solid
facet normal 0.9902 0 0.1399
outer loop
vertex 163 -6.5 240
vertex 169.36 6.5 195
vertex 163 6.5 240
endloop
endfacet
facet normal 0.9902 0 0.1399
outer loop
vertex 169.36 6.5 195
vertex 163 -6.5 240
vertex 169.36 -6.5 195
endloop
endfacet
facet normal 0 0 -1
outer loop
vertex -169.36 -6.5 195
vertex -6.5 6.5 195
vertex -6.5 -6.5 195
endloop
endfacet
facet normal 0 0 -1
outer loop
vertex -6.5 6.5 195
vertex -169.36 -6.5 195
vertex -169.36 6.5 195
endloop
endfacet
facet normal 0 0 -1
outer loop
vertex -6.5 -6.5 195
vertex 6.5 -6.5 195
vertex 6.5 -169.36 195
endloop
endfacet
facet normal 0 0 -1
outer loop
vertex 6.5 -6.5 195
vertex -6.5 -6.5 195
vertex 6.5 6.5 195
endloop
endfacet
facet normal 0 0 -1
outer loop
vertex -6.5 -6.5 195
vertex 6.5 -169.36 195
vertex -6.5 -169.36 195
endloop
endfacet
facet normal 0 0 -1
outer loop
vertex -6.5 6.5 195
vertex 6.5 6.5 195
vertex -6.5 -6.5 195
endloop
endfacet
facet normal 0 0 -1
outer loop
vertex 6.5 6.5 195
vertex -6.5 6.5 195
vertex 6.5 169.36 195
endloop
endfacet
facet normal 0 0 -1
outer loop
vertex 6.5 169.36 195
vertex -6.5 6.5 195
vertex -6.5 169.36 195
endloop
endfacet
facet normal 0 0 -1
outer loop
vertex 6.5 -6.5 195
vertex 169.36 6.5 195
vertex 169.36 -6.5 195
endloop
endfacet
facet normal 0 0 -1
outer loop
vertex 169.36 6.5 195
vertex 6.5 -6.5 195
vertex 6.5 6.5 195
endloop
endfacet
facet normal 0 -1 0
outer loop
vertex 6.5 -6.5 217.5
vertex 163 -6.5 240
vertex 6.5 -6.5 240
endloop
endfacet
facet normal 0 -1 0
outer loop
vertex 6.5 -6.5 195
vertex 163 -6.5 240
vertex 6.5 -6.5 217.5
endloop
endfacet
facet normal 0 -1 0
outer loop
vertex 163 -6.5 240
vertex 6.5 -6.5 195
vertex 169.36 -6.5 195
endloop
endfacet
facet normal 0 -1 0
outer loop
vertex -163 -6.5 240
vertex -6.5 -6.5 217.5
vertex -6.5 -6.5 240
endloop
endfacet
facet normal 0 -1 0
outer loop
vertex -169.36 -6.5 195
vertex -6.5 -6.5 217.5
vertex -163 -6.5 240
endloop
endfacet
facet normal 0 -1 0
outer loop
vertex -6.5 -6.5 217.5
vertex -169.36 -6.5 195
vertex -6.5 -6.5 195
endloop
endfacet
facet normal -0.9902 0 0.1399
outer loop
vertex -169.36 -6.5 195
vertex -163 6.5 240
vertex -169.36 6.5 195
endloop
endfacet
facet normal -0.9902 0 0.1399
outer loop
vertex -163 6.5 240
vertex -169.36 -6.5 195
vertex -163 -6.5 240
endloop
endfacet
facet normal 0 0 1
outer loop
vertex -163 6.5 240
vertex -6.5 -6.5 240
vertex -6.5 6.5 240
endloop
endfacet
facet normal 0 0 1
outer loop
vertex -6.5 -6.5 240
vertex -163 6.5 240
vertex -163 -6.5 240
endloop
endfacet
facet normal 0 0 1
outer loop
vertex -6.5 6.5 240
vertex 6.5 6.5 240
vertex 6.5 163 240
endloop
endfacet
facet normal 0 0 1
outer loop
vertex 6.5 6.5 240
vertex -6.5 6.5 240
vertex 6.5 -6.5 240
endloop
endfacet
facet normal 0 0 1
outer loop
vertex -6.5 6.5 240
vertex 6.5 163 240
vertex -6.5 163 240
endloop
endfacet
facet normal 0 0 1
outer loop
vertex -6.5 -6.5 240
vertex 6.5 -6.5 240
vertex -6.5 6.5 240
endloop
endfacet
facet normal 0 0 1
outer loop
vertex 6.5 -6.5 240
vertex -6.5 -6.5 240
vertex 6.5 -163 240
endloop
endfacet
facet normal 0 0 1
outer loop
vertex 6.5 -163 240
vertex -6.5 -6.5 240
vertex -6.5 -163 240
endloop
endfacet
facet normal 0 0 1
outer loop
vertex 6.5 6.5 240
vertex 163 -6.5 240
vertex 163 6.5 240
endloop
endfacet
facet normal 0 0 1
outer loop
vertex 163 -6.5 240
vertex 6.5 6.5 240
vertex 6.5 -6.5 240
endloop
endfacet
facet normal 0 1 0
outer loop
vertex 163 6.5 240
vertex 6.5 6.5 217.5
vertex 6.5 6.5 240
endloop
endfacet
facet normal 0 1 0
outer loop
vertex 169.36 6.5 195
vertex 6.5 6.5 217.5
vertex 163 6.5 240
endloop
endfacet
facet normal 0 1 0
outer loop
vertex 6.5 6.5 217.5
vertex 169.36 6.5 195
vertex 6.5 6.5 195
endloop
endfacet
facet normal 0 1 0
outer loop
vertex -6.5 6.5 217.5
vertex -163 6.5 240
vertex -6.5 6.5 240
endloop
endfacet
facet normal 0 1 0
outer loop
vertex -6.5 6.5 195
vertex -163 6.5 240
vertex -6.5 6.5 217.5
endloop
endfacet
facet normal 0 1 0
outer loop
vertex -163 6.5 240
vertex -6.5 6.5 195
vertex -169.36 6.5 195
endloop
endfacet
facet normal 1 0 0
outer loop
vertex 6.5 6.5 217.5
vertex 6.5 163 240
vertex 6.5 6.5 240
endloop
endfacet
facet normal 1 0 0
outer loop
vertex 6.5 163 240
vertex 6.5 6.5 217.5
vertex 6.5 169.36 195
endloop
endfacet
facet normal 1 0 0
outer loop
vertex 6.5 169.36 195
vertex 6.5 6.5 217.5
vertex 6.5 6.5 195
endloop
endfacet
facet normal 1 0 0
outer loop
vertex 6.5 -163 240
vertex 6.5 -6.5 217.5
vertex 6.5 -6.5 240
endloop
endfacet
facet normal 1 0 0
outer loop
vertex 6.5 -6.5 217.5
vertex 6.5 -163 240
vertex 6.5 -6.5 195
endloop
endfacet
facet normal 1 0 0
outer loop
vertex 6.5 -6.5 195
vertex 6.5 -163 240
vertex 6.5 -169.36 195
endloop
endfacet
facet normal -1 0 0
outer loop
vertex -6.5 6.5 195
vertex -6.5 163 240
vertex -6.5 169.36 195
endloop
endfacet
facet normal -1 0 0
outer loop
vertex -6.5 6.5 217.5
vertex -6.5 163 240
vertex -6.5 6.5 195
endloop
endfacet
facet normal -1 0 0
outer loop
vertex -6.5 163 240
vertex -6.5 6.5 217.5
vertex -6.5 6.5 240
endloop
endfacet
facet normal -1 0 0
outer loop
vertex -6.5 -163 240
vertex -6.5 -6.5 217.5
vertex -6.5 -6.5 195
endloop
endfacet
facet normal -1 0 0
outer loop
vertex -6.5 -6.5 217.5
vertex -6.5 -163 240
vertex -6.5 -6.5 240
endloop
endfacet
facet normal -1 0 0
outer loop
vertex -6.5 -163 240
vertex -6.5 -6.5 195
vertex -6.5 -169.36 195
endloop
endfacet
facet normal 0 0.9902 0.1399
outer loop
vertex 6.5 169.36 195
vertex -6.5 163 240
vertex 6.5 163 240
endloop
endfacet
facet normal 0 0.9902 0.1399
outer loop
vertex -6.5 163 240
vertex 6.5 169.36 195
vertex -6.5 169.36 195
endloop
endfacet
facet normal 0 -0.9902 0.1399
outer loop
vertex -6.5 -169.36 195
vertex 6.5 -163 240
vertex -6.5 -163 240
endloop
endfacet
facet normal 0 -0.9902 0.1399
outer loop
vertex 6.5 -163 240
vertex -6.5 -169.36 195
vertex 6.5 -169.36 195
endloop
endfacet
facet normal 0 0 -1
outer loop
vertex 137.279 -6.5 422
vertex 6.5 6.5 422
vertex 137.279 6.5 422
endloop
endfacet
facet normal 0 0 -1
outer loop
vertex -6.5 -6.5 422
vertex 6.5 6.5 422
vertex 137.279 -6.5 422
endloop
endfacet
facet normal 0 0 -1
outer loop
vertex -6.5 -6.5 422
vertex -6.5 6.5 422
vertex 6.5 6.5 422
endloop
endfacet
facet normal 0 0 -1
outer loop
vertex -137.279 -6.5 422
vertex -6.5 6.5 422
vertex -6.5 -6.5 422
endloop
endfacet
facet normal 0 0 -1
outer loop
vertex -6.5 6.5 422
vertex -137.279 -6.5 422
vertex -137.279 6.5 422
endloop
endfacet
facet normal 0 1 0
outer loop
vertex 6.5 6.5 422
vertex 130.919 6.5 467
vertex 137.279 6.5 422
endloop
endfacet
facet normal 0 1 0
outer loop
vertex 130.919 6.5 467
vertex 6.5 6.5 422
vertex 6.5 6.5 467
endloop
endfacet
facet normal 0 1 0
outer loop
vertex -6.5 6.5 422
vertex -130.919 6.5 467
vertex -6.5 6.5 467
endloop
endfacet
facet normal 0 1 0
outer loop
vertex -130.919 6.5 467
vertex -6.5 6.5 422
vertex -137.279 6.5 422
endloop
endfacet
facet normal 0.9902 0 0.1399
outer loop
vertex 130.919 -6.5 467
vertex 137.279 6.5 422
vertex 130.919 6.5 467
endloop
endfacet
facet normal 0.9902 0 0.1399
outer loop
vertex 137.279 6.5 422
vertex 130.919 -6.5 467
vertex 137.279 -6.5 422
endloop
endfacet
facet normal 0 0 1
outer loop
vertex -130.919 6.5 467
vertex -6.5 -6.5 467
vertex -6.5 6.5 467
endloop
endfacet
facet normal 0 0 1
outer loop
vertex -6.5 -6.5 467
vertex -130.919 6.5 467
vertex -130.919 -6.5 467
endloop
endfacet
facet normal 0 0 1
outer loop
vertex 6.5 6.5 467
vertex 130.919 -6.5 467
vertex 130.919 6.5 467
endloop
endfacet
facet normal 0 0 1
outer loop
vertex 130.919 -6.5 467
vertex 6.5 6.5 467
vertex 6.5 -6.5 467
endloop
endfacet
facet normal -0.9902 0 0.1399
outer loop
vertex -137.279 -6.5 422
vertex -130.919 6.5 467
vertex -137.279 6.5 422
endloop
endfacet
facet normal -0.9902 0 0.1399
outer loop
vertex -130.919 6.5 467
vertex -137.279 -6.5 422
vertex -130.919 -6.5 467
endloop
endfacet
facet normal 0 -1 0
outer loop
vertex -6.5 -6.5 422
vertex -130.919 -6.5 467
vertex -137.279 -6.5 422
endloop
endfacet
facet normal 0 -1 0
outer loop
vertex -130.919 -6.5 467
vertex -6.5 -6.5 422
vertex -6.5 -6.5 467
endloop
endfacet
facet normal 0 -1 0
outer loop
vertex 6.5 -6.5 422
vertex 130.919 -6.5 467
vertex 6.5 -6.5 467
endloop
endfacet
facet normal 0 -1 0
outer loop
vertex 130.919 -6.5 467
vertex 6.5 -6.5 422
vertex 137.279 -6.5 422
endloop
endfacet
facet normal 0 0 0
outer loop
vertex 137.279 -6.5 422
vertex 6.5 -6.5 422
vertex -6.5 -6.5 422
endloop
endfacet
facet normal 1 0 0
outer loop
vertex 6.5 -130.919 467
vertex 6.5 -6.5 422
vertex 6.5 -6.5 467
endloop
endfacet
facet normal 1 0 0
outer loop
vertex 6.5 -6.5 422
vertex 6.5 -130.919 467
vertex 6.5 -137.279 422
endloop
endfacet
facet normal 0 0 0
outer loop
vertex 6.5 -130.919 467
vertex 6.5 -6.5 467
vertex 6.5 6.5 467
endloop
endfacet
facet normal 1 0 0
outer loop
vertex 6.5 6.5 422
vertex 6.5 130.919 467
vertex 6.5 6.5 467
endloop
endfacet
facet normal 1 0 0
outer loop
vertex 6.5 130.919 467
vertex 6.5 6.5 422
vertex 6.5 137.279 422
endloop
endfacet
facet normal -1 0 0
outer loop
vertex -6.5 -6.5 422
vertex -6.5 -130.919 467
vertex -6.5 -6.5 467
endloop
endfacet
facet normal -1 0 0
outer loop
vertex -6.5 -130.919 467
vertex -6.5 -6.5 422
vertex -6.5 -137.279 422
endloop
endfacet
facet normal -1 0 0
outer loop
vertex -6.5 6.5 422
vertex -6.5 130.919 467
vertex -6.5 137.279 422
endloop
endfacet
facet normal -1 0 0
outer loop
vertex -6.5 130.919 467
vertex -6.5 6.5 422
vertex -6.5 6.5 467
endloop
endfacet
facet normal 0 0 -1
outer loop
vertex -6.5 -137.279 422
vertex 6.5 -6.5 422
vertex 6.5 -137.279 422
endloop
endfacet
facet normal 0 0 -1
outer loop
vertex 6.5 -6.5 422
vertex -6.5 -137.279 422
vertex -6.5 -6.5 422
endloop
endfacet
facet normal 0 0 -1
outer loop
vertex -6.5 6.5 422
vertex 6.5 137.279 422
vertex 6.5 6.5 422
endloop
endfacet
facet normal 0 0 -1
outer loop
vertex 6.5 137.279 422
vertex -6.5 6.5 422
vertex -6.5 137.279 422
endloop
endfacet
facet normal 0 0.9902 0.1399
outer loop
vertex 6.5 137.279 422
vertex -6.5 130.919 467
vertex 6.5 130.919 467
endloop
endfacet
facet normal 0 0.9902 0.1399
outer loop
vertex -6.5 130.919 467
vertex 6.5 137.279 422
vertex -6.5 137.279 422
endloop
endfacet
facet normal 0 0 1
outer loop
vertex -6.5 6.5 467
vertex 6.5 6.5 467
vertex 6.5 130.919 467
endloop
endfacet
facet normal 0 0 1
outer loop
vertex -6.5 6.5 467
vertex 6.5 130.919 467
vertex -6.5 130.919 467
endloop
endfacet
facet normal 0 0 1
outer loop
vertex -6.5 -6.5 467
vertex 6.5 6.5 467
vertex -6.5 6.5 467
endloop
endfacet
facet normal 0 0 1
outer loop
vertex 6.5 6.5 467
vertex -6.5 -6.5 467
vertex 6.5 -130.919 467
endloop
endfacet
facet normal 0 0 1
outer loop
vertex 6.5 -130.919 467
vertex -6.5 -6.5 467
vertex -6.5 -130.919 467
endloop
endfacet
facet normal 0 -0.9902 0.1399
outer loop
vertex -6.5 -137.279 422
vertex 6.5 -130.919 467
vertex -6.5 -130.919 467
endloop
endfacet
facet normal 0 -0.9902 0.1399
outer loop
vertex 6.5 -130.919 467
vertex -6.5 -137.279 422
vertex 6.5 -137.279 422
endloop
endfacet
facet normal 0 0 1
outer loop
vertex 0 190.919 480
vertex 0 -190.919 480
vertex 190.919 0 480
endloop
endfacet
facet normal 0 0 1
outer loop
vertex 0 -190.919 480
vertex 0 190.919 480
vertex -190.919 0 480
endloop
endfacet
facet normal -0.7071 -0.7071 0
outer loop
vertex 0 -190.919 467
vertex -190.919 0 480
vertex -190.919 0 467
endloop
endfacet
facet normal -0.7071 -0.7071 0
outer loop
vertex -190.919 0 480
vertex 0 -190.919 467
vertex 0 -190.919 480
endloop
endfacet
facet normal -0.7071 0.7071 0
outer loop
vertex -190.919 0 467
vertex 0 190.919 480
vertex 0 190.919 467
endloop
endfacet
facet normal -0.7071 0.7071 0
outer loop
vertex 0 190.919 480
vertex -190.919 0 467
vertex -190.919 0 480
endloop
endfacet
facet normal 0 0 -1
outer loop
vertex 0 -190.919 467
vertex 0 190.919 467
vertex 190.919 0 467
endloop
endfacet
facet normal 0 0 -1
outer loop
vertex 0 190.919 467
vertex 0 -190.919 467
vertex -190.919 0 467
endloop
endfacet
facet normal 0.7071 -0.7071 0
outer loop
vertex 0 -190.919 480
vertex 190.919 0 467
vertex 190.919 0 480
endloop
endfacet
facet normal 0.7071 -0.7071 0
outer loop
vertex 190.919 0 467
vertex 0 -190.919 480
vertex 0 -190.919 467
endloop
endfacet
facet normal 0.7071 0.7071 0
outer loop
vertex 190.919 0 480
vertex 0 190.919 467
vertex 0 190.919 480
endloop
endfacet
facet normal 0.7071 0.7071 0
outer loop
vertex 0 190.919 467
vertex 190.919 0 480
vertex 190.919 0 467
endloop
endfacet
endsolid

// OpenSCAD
// Archiyou -> OpenSCAD  |  script: kakpinchedstool  |  units: mm
// OpenSCAD has no units: coordinates are in mm.
// Parts: 7 CSG, 0 baked, 1 2D
// Skipped: horizontalSideEdge (open curve), horizontalSideEdge (open curve)
// Parameters at export, for reference only (nothing in this file is linked to them):
//   HEIGHT = 480
//   DEPTH = 270
//   LEG_WIDTH = 45
//   LEG_THICKNESS = 13

$fn = 32;
PART = "";

// Mesh  (layer leg): 2D, a surface without volume, drawn in its own plane: origin [-169.359944411, 0, 195], x [0.139937016816, 0, 0.990160406866], y [0, 1, 0]
module Mesh() {
    color([0, 0.502, 0]) polygon([[0, 0], [274.702965412, 0], [274.702965412, 13], [0, 13], [-196.937787704, 6.5], [-196.937787704, -6.5]]);
}

// horizontalMiddle  (layer horizontals)
module horizontalMiddle() {
    color([1, 0, 0]) difference() {
        multmatrix([[1, 0, 0, -169.359944411], [0, 0, -1, 6.5], [0, 1, 0, 195], [0, 0, 0, 1]]) linear_extrude(height = 13) polygon([[0, 0], [338.719888821, 0], [332.360145781, 45], [6.35974304069, 45]]);
        translate([0, 0, 240]) cube([13, 100, 45], center = true);
    }
}

// horizontalMiddleCrossed  (layer horizontals)
module horizontalMiddleCrossed() {
    color([1, 0, 0]) difference() {
        multmatrix([[0, 0, 1, -6.5], [1, 0, 0, -169.359944411], [0, 1, 0, 195], [0, 0, 0, 1]]) linear_extrude(height = 13) polygon([[0, 0], [338.719888821, 0], [332.360145781, 45], [6.35974304069, 45]]);
        multmatrix([[0, -1, 0, 0], [1, 0, 0, 0], [0, 0, 1, 195], [0, 0, 0, 1]]) cube([13, 100, 45], center = true);
    }
}

// horizontalSeat  (layer horizontals)
module horizontalSeat() {
    color([1, 0, 0]) difference() {
        multmatrix([[0.139937016816, 0.990160406866, 0, -137.278573961], [0, 0, 1, -6.5], [0.990160406866, -0.139937016816, 0, 422], [0, 0, 0, 1]]) linear_extrude(height = 13) polygon([[0, 0], [45.4471817778, 0], [82.0879630659, 259.261285781], [38.4207082258, 271.855617294]]);
        translate([0, 0, 466.822153116]) cube([13, 100, 45], center = true);
    }
}

// horizontalSeatCrossed  (layer horizontals)
module horizontalSeatCrossed() {
    color([1, 0, 0]) difference() {
        multmatrix([[0, 0, -1, 6.5], [0.139937016816, 0.990160406866, 0, -137.278573961], [0.990160406866, -0.139937016816, 0, 422], [0, 0, 0, 1]]) linear_extrude(height = 13) polygon([[0, 0], [45.4471817778, 0], [82.0879630659, 259.261285781], [38.4207082258, 271.855617294]]);
        multmatrix([[0, -1, 0, 0], [1, 0, 0, 0], [0, 0, 1, 421.53823681], [0, 0, 0, 1]]) cube([13, 100, 45], center = true);
    }
}

// Mesh:Box  (layer seat)
module Mesh_Box() {
    color([0, 0, 1]) multmatrix([[0.707106781187, -0.707106781187, 0, -63.6396103068], [0.707106781187, 0.707106781187, 0, -63.6396103068], [0, 0, 1, 473.5], [0, 0, 0, 1]]) cube([90, 270, 13], center = true);
}

// Mesh:Box  (layer seat)
module Mesh_Box_2() {
    color([0, 0, 1]) multmatrix([[0.707106781187, -0.707106781187, 0, 0], [0.707106781187, 0.707106781187, 0, 0], [0, 0, 1, 473.5], [0, 0, 0, 1]]) cube([90, 270, 13], center = true);
}

// Mesh:Box  (layer seat)
module Mesh_Box_3() {
    color([0, 0, 1]) multmatrix([[0.707106781187, -0.707106781187, 0, 63.6396103068], [0.707106781187, 0.707106781187, 0, 63.6396103068], [0, 0, 1, 473.5], [0, 0, 0, 1]]) cube([90, 270, 13], center = true);
}

// 3D parts
if (PART == "" || PART == "horizontalMiddle") horizontalMiddle();
if (PART == "" || PART == "horizontalMiddleCrossed") horizontalMiddleCrossed();
if (PART == "" || PART == "horizontalSeat") horizontalSeat();
if (PART == "" || PART == "horizontalSeatCrossed") horizontalSeatCrossed();
if (PART == "" || PART == "Mesh_Box") Mesh_Box();
if (PART == "" || PART == "Mesh_Box_2") Mesh_Box_2();
if (PART == "" || PART == "Mesh_Box_3") Mesh_Box_3();
// 2D parts: select one with PART (OpenSCAD cannot render 2D and 3D together)
if (PART == "Mesh") Mesh();
